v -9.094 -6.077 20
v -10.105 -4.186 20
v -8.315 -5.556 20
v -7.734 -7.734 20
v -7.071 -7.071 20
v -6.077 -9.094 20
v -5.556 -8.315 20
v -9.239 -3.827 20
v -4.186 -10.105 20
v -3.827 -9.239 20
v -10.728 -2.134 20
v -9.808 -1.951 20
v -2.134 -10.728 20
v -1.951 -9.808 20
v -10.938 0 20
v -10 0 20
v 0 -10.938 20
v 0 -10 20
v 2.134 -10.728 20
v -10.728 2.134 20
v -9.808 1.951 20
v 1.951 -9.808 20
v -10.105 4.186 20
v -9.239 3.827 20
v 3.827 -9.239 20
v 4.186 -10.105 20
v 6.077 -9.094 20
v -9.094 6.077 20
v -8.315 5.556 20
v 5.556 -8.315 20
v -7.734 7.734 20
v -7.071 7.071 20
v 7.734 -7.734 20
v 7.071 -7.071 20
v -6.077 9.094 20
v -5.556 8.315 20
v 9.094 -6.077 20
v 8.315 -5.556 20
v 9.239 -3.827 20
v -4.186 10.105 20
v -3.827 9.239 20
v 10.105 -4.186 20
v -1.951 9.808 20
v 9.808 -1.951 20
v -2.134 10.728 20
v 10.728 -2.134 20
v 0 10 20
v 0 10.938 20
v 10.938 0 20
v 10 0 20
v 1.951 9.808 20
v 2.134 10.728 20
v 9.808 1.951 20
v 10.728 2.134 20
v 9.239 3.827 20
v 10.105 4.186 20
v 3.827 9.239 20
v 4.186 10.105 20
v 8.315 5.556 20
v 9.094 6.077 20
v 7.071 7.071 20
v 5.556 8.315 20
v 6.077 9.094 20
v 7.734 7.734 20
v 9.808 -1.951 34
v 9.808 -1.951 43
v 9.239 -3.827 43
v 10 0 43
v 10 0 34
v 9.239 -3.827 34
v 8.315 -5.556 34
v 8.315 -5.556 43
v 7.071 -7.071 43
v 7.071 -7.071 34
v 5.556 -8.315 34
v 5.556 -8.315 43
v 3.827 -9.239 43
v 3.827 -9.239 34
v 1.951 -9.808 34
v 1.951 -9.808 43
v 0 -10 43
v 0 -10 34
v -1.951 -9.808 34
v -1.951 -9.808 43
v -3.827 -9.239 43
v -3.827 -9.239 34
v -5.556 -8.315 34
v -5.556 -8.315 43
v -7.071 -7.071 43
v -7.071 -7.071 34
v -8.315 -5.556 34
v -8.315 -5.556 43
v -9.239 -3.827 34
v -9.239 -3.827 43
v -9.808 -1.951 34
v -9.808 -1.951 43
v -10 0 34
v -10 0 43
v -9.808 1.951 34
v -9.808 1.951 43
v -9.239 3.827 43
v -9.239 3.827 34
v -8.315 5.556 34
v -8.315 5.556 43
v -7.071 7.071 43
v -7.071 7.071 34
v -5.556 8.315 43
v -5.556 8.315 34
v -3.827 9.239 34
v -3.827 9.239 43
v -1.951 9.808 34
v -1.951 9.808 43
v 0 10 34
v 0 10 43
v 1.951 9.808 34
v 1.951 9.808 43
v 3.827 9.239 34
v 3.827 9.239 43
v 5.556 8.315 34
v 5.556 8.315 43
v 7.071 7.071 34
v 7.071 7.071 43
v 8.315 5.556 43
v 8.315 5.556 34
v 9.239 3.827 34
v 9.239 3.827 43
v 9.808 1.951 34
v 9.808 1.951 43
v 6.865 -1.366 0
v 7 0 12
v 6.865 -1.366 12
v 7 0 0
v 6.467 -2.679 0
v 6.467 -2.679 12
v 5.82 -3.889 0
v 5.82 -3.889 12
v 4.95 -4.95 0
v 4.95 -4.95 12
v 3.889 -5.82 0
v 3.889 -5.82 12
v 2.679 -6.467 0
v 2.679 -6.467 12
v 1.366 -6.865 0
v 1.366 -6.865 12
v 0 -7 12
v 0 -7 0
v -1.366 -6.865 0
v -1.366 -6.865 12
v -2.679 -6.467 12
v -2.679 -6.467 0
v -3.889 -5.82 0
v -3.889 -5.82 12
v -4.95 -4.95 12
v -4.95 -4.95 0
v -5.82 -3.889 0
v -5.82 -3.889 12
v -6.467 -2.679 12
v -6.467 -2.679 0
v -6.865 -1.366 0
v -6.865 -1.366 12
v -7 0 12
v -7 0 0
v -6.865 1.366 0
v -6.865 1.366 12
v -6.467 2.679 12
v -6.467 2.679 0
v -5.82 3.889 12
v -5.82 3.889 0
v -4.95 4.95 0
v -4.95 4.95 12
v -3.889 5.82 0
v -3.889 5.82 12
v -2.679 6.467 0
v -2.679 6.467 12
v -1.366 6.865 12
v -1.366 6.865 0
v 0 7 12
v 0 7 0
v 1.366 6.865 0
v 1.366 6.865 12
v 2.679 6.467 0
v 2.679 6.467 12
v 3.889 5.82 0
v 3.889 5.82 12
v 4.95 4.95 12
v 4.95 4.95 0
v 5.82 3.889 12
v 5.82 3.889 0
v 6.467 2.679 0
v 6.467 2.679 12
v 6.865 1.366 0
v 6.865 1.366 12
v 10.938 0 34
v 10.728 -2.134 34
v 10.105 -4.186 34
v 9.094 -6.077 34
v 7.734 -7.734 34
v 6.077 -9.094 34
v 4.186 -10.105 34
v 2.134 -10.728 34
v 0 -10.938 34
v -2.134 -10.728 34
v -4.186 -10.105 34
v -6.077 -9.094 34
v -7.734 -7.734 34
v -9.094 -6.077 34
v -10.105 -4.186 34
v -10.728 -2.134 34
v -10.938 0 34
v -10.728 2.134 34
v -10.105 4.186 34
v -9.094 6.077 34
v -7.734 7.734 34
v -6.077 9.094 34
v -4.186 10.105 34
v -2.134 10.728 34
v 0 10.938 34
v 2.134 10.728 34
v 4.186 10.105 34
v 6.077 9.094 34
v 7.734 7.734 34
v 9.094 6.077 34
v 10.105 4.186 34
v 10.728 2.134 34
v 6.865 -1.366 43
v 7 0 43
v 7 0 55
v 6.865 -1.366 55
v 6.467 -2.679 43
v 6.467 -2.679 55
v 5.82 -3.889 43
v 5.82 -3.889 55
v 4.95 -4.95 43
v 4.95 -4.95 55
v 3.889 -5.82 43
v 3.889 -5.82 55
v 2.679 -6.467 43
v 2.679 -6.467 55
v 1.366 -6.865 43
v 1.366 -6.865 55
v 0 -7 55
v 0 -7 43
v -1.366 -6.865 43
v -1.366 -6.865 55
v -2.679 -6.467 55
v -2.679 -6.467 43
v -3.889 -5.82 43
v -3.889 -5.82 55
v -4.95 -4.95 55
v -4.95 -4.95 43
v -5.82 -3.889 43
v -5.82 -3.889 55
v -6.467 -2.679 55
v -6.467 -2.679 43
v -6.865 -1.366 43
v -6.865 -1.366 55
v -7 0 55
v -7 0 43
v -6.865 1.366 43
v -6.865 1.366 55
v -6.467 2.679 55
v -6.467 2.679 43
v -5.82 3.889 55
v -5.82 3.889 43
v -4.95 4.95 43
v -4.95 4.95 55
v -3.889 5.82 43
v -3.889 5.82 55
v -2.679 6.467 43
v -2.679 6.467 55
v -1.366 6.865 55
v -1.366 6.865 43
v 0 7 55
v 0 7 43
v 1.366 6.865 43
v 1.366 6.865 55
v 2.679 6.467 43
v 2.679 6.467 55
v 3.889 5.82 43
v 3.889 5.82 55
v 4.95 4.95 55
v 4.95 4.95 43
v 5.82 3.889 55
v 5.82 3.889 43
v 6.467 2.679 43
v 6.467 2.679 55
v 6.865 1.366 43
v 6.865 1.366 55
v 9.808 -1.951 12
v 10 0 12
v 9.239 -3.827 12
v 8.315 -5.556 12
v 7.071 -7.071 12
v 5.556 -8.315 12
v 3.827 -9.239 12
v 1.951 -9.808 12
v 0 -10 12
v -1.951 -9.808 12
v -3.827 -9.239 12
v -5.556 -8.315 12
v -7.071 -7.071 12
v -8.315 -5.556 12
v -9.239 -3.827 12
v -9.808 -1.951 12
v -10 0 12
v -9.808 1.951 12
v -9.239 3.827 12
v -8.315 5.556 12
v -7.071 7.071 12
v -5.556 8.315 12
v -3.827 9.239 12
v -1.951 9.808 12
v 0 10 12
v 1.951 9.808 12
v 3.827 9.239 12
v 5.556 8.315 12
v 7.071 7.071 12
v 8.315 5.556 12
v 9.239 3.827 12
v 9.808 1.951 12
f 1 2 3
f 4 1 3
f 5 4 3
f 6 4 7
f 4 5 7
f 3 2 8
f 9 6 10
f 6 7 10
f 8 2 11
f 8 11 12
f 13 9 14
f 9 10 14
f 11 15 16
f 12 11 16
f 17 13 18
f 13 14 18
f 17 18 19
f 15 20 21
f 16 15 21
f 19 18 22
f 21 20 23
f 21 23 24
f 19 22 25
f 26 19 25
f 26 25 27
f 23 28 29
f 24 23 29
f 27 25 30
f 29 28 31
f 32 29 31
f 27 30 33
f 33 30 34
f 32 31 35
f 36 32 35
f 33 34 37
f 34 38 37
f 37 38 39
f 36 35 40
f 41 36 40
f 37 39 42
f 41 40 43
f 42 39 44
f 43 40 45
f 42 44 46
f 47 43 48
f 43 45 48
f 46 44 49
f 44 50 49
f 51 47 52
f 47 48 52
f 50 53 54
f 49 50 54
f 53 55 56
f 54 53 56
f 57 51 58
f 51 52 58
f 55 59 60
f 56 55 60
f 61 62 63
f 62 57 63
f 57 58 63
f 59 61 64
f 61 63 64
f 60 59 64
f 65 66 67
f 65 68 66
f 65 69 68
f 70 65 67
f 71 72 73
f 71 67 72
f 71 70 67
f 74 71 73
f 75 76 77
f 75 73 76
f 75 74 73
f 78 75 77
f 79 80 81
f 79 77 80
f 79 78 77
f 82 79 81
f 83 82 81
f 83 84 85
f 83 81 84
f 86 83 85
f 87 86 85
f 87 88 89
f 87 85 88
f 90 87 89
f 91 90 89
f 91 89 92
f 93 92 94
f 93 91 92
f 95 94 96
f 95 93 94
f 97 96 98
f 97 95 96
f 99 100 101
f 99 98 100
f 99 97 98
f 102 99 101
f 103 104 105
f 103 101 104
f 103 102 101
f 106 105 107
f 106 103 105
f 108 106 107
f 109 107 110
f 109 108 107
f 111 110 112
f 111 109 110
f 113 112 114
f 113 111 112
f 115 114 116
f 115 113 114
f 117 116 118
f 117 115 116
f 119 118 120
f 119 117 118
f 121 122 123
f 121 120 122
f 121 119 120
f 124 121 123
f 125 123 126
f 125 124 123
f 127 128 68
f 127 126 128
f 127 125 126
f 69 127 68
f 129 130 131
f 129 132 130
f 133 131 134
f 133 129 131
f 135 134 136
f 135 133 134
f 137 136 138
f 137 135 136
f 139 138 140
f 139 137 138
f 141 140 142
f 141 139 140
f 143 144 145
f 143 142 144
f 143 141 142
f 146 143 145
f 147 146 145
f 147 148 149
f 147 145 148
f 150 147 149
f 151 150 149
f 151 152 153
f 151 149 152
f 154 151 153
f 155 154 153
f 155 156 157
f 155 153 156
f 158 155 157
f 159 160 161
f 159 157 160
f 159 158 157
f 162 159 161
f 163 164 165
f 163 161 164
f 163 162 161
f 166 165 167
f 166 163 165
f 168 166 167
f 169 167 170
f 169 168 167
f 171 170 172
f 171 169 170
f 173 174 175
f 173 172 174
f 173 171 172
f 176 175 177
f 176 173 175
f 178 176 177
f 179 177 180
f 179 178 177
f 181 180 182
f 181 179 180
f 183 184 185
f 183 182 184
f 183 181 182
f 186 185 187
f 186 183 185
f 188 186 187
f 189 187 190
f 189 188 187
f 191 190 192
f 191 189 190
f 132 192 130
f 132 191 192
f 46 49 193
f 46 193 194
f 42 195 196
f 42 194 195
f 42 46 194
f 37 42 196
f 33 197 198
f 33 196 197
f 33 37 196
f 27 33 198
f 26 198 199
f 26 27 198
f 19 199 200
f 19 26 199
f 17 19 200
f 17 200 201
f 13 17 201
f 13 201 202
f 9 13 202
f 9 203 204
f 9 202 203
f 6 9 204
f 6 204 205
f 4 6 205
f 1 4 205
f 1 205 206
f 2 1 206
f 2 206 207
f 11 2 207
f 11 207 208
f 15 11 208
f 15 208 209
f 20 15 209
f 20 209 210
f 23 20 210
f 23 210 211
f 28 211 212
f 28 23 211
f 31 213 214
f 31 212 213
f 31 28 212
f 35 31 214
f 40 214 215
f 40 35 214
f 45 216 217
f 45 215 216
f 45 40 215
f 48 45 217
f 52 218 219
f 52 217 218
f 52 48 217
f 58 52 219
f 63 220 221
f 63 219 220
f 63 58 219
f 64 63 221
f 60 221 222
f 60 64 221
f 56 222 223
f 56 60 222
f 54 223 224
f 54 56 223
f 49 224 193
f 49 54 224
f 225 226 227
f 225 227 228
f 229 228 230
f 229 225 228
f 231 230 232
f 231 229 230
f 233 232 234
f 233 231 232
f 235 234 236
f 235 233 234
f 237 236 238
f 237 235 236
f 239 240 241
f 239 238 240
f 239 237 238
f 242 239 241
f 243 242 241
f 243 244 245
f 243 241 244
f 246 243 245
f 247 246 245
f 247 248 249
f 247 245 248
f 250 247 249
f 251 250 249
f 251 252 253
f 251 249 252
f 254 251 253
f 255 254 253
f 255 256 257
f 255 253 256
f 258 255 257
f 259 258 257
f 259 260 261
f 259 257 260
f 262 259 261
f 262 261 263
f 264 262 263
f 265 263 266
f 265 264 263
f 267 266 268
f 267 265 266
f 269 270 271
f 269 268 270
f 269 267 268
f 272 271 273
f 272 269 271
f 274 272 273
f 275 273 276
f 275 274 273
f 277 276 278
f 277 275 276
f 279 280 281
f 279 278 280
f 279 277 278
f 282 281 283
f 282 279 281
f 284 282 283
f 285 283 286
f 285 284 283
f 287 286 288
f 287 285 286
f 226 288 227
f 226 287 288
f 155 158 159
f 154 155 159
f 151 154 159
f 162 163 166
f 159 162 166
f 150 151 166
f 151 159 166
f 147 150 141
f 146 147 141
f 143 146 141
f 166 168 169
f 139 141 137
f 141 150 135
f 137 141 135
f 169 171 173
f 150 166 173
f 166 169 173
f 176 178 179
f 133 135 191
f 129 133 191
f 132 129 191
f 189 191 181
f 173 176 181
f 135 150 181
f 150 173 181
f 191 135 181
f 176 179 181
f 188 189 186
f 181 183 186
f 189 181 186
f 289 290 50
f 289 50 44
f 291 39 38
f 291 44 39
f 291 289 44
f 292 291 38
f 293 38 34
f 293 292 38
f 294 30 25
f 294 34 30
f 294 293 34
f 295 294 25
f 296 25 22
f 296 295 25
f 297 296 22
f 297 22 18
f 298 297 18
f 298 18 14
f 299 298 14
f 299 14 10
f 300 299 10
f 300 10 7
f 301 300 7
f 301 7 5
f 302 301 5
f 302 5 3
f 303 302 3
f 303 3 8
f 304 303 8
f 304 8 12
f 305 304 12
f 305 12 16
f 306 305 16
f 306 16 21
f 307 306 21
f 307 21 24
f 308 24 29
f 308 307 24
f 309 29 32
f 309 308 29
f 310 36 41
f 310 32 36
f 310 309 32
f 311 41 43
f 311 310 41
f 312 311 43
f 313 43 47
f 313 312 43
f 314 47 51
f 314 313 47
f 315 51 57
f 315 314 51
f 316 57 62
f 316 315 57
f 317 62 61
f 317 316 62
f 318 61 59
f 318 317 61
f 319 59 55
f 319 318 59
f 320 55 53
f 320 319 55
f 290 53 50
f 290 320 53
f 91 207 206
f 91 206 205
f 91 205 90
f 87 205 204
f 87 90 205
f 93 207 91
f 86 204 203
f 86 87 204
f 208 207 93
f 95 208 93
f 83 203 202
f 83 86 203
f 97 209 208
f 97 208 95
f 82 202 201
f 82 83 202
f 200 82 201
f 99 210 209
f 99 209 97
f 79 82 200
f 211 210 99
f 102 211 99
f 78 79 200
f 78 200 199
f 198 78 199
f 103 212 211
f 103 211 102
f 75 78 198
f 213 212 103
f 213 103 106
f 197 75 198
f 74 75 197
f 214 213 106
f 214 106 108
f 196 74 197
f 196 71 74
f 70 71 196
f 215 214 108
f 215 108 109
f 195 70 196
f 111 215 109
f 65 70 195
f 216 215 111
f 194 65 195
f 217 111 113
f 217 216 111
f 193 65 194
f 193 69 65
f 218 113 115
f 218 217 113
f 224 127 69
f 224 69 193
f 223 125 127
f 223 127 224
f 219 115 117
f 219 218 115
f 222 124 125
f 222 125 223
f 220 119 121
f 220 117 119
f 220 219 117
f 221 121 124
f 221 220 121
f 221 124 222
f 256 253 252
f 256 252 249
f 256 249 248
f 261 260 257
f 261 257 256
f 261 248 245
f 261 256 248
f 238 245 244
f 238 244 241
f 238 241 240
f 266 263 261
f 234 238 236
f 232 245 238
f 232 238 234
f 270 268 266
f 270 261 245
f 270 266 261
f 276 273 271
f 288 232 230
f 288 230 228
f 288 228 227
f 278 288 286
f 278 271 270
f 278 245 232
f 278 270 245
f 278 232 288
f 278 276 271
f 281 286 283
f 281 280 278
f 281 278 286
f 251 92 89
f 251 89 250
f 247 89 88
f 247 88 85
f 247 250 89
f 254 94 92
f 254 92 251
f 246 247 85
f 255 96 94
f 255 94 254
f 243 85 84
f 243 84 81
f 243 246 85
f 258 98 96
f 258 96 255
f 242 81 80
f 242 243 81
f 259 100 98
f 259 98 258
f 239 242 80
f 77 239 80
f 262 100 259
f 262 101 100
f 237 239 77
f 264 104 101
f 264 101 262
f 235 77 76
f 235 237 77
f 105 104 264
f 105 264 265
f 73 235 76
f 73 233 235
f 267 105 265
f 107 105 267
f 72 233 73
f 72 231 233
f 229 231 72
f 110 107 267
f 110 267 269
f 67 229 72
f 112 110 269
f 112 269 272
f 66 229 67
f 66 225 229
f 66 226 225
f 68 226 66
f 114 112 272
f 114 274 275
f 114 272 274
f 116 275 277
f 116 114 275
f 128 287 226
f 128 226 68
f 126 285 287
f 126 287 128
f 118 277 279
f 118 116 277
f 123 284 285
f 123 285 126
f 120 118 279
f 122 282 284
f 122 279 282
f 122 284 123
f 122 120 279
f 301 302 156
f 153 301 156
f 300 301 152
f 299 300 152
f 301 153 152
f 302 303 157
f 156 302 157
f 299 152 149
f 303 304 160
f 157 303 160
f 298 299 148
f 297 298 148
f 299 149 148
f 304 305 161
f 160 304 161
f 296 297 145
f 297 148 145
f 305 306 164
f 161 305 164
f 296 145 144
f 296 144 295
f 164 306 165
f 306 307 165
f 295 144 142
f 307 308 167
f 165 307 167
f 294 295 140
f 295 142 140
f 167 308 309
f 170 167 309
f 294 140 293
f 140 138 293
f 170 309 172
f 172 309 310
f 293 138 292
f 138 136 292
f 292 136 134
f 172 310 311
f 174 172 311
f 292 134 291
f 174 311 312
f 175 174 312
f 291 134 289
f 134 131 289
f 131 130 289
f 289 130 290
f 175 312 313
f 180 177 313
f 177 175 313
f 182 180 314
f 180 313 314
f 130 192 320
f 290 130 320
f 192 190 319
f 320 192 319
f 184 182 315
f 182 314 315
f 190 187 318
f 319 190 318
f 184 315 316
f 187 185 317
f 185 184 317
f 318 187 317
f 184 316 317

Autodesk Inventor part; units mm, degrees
ref_plane "YZ Plane" through (0, 0, 0) normal (1, 0, 0) x (0, 1, 0)
ref_plane "XZ Plane" through (0, 0, 0) normal (0, 1, 0) x (-1, 0, 0)
ref_plane "XY Plane" through (0, 0, 0) normal (0, 0, 1) x (1, 0, 0)
sketch "Sketch1" plane through (0, 0, 0) normal (0, 0, 1) x (1, 0, 0)
  circle A0 centre (0, 0) radius 7
  dimension "d0" = 14
extrude "Extrusion1" add sketch "Sketch1" along normal blind 12
sketch "Sketch2" plane through (0, 0, 12) normal (0, 0, 1) x (1, 0, 0)
  circle A0 centre (0, 0) radius 10
  dimension "d3" = 20
extrude "Extrusion2" add sketch "Sketch2" along normal blind 8
sketch "Sketch3" plane through (0, 0, 20) normal (0, 0, 1) x (1, 0, 0)
  circle A0 centre (0, 0) radius 10.9378
extrude "Extrusion3" add sketch "Sketch3" along normal blind 14
sketch "Sketch4" plane through (0, 0, 34) normal (0, 0, 1) x (1, 0, 0)
  circle A0 centre (0, 0) radius 10
extrude "Extrusion4" add sketch "Sketch4" along normal blind 9
sketch "Sketch5" plane through (0, 0, 43) normal (0, 0, 1) x (1, 0, 0)
  circle A0 centre (0, 0) radius 7
  dimension "d10" = 14
extrude "Extrusion5" add sketch "Sketch5" along normal blind 12
properties part number "eje escalonado"
